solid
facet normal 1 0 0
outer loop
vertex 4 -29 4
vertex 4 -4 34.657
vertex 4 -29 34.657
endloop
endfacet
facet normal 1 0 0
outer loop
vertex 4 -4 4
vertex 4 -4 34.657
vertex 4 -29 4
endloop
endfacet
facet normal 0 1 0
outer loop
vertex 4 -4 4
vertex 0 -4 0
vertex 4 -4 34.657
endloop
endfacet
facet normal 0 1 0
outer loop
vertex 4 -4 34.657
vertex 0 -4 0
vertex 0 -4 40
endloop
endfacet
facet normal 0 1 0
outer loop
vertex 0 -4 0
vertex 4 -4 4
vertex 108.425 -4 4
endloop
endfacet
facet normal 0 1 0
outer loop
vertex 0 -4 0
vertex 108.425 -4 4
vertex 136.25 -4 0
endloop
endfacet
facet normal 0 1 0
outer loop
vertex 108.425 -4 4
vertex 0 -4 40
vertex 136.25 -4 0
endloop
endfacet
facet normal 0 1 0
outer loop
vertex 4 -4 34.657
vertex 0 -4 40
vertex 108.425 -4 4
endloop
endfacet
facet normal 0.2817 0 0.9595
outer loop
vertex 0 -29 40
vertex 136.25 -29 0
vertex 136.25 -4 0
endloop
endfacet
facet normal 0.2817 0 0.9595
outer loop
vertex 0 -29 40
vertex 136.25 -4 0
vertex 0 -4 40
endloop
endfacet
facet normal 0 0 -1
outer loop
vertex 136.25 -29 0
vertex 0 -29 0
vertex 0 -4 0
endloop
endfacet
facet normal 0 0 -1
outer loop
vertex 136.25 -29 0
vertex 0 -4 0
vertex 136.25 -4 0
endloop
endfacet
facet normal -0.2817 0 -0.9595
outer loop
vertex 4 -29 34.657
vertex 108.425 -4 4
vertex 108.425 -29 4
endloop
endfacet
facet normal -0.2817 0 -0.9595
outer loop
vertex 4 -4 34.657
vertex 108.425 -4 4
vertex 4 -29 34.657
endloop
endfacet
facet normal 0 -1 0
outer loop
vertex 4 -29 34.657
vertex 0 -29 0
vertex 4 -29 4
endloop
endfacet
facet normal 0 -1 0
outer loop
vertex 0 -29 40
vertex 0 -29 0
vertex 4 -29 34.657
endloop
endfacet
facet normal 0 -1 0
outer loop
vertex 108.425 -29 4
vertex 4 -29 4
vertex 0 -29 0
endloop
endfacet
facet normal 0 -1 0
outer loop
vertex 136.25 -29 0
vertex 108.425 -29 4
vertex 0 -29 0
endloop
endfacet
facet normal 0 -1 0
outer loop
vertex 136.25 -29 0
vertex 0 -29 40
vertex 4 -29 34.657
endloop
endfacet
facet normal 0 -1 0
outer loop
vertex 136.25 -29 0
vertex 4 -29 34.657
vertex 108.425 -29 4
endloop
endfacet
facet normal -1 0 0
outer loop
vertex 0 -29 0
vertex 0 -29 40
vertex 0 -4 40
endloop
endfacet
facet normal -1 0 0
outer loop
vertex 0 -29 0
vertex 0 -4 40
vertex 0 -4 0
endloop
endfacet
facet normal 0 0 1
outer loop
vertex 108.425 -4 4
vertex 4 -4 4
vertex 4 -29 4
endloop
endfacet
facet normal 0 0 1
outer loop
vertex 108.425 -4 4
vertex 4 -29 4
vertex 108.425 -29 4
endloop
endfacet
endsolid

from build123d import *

# Parameters (mm, degrees)
F1_DEPTH = 33
F2_ANGLE = 90
F3_T     = -4
F4_ANGLE = -90
F5_START = -4
F5_DEPTH = 25


with BuildPart() as f1:
    # F0 (on Front) → F1 (new body)
    with BuildSketch(Plane.XZ):
        Polygon((0, 40), (0, 0), (136.249770642, 0), align=None)
    extrude(amount=F1_DEPTH)


with BuildPart() as f1_1:
    # F2: moved
    add(f1.part.rotate(Axis((68.124885321, 0, 0), (-1, 0, 0)), F2_ANGLE))

    # F3 (hollow: no face is removed)
    offset(amount=F3_T, mode=Mode.SUBTRACT)


with BuildPart() as f1_2:
    # F4: moved
    add(f1_1.part.rotate(Axis((68.124885321, 0, 0), (-1, 0, 0)), F4_ANGLE))

    # F1_face (on face) → F5 (intersect)
    with BuildSketch(Plane(origin=(45.416590214, -33, 13.3333333333), x_dir=(1, 0, 0), z_dir=(0, -1, 0)).offset(F5_START)):
        Polygon((-45.416590214, 26.6666666667), (-45.416590214, -13.3333333333), (90.833180428, -13.3333333333), align=None)
    extrude(amount=-F5_DEPTH, mode=Mode.INTERSECT)


solid = f1_2.part
